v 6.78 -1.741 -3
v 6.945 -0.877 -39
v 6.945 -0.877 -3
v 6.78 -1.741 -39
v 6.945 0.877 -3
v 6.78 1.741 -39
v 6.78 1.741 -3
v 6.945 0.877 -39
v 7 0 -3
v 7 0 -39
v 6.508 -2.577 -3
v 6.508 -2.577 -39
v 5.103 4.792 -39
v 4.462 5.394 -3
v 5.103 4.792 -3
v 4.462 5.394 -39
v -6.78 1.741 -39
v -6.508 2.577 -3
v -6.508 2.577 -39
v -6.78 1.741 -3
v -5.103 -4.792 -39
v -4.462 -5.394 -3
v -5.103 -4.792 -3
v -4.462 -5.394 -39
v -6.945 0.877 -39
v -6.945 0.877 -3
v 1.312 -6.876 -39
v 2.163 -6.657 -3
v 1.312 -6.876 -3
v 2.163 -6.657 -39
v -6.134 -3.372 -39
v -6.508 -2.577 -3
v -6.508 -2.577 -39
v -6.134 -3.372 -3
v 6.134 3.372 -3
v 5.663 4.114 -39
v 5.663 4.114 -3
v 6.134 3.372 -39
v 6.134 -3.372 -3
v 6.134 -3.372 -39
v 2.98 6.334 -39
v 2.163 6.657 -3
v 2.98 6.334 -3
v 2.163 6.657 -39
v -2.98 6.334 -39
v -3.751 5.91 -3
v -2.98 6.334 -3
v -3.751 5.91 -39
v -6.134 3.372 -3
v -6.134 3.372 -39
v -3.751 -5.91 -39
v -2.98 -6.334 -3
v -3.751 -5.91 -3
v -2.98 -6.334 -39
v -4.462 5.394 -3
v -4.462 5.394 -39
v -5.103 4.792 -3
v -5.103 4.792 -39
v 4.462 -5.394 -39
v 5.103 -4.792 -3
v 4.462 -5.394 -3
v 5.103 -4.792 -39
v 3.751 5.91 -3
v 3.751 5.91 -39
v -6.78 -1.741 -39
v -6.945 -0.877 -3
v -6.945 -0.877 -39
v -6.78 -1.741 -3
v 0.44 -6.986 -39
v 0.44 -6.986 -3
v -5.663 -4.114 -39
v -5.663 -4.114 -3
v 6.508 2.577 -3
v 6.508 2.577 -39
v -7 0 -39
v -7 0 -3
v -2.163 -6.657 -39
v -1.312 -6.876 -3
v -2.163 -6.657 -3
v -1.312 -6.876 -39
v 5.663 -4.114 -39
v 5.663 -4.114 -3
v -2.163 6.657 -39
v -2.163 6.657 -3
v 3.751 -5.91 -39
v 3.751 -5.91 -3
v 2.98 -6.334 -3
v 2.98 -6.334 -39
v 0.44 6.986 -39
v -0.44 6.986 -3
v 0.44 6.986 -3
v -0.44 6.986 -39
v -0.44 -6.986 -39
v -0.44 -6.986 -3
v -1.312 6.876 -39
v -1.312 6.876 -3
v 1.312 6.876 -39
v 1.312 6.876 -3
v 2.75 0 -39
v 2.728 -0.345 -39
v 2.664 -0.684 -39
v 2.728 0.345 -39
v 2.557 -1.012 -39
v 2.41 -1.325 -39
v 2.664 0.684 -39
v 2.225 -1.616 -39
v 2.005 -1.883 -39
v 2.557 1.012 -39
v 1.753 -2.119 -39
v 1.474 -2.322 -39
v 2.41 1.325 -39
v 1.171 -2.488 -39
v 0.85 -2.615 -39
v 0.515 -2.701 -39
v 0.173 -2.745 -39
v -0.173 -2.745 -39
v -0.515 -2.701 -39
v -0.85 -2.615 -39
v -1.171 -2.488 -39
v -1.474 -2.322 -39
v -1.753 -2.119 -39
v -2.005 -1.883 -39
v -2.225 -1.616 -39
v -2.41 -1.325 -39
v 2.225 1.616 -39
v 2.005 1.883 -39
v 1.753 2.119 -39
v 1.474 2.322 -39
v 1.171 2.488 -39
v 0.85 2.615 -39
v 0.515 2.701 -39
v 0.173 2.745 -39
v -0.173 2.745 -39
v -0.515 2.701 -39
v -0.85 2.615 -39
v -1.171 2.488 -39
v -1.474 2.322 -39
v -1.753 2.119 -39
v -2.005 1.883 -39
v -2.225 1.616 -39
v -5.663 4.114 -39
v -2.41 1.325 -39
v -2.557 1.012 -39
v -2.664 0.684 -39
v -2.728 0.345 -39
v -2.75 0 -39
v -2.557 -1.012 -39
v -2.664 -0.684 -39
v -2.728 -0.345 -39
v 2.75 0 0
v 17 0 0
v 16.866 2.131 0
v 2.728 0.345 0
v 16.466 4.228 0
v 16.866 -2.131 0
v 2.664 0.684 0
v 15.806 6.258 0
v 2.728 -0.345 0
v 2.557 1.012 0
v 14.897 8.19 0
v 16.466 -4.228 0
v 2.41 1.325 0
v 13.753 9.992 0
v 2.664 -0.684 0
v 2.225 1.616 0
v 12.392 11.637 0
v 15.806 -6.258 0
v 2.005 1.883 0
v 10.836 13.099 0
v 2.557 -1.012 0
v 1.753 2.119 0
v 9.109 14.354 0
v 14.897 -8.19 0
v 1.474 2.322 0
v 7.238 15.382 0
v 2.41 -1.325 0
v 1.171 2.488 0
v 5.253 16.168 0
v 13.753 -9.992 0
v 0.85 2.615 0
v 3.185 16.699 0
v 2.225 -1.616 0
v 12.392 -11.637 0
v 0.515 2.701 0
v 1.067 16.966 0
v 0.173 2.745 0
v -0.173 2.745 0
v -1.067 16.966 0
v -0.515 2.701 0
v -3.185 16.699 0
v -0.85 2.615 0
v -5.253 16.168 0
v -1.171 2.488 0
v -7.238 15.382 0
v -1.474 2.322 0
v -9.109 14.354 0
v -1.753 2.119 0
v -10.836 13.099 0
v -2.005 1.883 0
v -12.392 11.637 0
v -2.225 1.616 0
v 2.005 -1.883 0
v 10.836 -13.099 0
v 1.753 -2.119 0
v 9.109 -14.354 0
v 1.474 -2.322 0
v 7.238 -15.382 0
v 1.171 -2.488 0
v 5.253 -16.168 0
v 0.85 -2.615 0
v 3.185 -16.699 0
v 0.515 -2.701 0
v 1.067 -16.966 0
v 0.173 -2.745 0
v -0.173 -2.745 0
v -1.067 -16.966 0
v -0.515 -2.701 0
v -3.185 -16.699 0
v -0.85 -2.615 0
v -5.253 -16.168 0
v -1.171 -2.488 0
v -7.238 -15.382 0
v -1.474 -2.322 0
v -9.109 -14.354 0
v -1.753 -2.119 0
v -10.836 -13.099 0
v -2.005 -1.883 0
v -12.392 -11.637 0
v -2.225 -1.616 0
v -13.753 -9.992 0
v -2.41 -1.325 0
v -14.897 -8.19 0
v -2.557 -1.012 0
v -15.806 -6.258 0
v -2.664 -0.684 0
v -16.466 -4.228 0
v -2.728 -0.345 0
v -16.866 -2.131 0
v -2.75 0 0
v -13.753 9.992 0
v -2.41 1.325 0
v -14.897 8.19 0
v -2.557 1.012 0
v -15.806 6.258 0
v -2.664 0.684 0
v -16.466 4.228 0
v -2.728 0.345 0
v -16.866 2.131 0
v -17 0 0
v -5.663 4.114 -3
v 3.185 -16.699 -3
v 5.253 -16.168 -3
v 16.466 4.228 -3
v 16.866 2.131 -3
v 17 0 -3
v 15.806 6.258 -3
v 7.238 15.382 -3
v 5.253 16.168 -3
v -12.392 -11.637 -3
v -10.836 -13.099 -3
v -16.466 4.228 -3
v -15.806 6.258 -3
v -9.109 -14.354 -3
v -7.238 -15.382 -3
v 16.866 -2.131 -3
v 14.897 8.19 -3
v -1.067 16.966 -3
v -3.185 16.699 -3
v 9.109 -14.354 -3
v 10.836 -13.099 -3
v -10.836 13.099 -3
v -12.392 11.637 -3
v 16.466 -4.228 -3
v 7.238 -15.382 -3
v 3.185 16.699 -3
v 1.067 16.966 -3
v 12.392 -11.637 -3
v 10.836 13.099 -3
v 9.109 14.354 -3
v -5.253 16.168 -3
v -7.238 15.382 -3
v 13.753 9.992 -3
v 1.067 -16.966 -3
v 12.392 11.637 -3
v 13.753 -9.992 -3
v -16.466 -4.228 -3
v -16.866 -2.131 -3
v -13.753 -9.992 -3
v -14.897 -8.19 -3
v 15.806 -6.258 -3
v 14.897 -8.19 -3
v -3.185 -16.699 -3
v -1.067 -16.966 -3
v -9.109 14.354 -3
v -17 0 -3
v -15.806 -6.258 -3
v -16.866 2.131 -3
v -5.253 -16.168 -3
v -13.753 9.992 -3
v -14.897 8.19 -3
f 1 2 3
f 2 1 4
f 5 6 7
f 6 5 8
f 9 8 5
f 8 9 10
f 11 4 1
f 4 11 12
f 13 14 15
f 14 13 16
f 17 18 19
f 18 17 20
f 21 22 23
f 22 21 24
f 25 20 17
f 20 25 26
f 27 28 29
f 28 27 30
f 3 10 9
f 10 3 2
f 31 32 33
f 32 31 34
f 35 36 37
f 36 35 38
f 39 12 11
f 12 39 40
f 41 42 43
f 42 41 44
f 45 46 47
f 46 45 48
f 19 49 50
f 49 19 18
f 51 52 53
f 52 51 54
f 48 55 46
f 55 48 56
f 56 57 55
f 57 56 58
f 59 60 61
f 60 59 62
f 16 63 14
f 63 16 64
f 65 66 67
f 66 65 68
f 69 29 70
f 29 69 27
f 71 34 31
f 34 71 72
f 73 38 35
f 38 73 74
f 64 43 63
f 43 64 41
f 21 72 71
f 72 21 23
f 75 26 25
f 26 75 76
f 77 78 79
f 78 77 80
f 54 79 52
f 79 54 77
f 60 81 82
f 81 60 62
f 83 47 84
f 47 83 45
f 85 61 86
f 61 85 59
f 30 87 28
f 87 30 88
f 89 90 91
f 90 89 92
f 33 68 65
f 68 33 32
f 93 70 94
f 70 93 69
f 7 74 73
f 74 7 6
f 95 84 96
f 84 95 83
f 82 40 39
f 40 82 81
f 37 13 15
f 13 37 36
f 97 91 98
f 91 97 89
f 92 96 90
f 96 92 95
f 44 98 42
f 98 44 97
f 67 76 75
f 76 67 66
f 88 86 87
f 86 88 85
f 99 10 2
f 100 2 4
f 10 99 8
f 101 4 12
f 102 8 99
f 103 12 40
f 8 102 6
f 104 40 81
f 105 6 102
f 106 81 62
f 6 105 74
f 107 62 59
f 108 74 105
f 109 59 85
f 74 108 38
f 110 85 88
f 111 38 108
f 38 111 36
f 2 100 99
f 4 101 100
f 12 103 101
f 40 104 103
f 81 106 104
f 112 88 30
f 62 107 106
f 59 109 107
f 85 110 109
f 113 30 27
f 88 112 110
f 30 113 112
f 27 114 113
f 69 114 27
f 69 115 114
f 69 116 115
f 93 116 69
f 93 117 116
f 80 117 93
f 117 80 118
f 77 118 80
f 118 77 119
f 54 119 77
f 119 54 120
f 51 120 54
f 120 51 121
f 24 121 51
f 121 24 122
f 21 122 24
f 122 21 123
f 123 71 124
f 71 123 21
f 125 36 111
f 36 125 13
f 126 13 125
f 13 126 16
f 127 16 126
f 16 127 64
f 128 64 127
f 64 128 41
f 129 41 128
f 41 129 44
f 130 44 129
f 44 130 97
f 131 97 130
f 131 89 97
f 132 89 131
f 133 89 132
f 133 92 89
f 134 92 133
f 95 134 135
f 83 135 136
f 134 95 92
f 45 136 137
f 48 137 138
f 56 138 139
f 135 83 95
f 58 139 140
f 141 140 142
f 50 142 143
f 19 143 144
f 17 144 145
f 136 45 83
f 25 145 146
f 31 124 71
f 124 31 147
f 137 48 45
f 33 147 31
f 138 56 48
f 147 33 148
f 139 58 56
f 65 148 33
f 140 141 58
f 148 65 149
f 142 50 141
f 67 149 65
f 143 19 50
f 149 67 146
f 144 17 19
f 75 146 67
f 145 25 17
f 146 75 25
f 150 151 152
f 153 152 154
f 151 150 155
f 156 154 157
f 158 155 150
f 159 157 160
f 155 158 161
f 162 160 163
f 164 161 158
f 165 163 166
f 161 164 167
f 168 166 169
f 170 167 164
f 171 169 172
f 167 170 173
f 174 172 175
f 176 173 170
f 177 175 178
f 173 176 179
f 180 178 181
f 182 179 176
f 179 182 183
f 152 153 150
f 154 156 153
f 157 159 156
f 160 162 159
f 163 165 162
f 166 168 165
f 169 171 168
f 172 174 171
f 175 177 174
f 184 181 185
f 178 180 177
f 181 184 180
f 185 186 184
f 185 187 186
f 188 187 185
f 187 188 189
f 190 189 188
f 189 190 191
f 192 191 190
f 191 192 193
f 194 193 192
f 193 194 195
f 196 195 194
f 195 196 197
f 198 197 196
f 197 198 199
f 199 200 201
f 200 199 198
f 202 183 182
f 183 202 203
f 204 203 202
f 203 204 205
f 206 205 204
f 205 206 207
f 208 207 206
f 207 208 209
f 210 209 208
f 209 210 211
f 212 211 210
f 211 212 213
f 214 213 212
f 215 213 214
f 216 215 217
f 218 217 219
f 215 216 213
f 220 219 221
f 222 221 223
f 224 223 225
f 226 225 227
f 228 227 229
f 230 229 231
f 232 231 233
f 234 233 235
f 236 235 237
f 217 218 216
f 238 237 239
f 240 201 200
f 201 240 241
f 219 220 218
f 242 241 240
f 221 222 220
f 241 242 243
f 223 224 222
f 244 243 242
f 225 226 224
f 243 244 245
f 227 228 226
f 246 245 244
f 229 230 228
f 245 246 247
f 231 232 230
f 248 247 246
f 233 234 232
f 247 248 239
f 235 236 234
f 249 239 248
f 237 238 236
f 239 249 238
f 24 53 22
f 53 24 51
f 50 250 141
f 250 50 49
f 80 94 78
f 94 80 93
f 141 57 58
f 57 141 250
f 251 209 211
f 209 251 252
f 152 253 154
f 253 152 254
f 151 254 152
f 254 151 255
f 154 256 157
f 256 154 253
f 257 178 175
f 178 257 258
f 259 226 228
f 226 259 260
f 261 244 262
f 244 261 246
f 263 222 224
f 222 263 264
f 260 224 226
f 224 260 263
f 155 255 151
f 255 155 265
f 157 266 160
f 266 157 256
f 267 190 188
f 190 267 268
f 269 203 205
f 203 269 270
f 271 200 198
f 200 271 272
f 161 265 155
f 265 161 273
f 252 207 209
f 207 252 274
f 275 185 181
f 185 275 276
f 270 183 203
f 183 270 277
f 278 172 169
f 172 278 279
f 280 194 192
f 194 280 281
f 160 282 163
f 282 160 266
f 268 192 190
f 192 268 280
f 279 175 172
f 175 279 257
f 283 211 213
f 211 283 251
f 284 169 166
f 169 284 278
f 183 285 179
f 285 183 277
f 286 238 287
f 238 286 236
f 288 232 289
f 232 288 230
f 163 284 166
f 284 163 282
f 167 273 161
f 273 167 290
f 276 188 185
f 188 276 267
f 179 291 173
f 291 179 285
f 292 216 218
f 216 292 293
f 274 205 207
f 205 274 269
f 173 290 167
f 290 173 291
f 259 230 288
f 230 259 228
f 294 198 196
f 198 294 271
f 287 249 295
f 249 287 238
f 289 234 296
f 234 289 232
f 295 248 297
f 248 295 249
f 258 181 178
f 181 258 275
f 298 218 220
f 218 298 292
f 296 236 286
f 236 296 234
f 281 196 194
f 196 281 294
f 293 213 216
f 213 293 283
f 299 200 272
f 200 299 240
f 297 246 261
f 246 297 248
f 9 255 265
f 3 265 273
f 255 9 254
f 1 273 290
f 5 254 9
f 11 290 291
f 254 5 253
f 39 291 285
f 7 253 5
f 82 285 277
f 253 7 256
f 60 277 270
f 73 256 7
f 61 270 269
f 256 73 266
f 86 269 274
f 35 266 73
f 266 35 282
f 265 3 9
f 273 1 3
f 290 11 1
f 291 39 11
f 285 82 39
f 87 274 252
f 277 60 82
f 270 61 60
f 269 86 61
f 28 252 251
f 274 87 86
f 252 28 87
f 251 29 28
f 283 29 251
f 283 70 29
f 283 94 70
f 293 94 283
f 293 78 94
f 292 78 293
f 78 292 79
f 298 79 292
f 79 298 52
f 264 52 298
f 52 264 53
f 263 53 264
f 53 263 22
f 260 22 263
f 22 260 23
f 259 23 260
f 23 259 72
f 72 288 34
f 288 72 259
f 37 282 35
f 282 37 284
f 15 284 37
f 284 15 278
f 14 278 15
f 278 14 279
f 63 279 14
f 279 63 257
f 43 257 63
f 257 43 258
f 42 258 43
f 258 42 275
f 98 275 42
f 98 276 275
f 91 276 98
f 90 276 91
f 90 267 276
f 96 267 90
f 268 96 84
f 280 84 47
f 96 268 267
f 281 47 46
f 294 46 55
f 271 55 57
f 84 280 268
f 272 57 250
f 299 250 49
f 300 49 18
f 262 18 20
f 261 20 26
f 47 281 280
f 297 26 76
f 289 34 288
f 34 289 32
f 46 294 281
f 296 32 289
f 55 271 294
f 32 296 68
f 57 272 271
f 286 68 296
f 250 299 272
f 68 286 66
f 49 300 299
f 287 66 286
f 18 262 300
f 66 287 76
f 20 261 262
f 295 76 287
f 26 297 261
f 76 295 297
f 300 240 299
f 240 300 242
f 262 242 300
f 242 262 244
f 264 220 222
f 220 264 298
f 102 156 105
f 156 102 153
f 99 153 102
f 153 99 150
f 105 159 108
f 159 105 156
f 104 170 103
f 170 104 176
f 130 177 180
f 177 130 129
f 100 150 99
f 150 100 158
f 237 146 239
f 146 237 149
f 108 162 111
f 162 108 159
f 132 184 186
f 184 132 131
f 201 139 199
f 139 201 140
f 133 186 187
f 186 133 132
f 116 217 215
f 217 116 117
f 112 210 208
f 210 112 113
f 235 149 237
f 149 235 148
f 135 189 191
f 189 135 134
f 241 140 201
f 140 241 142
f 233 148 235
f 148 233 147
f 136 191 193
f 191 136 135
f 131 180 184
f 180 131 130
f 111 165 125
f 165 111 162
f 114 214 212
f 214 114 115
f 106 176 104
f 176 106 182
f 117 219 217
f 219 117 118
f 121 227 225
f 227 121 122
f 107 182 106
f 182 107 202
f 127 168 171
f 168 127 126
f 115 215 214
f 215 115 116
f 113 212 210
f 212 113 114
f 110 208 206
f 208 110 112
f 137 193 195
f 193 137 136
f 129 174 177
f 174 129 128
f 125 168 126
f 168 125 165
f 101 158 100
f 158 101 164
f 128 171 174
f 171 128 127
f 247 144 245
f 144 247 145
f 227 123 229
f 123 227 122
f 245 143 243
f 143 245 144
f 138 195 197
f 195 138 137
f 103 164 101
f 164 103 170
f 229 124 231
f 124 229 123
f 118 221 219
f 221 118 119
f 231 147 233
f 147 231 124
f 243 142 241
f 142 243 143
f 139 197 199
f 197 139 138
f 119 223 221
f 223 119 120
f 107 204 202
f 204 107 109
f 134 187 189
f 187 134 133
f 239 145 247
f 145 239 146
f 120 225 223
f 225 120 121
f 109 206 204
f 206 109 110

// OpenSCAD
$fn = 50;


difference() {
	union() {
		translate(v = [0, 0, -39.0000000000]) {
			cylinder(h = 39, r = 7.0000000000);
		}
		translate(v = [0, 0, -3.0000000000]) {
			cylinder(h = 3, r = 17.0000000000);
		}
	}
	union() {
		#translate(v = [0, 0, -39]) {
			cylinder(h = 39, r = 2.7500000000);
		}
	}
}
